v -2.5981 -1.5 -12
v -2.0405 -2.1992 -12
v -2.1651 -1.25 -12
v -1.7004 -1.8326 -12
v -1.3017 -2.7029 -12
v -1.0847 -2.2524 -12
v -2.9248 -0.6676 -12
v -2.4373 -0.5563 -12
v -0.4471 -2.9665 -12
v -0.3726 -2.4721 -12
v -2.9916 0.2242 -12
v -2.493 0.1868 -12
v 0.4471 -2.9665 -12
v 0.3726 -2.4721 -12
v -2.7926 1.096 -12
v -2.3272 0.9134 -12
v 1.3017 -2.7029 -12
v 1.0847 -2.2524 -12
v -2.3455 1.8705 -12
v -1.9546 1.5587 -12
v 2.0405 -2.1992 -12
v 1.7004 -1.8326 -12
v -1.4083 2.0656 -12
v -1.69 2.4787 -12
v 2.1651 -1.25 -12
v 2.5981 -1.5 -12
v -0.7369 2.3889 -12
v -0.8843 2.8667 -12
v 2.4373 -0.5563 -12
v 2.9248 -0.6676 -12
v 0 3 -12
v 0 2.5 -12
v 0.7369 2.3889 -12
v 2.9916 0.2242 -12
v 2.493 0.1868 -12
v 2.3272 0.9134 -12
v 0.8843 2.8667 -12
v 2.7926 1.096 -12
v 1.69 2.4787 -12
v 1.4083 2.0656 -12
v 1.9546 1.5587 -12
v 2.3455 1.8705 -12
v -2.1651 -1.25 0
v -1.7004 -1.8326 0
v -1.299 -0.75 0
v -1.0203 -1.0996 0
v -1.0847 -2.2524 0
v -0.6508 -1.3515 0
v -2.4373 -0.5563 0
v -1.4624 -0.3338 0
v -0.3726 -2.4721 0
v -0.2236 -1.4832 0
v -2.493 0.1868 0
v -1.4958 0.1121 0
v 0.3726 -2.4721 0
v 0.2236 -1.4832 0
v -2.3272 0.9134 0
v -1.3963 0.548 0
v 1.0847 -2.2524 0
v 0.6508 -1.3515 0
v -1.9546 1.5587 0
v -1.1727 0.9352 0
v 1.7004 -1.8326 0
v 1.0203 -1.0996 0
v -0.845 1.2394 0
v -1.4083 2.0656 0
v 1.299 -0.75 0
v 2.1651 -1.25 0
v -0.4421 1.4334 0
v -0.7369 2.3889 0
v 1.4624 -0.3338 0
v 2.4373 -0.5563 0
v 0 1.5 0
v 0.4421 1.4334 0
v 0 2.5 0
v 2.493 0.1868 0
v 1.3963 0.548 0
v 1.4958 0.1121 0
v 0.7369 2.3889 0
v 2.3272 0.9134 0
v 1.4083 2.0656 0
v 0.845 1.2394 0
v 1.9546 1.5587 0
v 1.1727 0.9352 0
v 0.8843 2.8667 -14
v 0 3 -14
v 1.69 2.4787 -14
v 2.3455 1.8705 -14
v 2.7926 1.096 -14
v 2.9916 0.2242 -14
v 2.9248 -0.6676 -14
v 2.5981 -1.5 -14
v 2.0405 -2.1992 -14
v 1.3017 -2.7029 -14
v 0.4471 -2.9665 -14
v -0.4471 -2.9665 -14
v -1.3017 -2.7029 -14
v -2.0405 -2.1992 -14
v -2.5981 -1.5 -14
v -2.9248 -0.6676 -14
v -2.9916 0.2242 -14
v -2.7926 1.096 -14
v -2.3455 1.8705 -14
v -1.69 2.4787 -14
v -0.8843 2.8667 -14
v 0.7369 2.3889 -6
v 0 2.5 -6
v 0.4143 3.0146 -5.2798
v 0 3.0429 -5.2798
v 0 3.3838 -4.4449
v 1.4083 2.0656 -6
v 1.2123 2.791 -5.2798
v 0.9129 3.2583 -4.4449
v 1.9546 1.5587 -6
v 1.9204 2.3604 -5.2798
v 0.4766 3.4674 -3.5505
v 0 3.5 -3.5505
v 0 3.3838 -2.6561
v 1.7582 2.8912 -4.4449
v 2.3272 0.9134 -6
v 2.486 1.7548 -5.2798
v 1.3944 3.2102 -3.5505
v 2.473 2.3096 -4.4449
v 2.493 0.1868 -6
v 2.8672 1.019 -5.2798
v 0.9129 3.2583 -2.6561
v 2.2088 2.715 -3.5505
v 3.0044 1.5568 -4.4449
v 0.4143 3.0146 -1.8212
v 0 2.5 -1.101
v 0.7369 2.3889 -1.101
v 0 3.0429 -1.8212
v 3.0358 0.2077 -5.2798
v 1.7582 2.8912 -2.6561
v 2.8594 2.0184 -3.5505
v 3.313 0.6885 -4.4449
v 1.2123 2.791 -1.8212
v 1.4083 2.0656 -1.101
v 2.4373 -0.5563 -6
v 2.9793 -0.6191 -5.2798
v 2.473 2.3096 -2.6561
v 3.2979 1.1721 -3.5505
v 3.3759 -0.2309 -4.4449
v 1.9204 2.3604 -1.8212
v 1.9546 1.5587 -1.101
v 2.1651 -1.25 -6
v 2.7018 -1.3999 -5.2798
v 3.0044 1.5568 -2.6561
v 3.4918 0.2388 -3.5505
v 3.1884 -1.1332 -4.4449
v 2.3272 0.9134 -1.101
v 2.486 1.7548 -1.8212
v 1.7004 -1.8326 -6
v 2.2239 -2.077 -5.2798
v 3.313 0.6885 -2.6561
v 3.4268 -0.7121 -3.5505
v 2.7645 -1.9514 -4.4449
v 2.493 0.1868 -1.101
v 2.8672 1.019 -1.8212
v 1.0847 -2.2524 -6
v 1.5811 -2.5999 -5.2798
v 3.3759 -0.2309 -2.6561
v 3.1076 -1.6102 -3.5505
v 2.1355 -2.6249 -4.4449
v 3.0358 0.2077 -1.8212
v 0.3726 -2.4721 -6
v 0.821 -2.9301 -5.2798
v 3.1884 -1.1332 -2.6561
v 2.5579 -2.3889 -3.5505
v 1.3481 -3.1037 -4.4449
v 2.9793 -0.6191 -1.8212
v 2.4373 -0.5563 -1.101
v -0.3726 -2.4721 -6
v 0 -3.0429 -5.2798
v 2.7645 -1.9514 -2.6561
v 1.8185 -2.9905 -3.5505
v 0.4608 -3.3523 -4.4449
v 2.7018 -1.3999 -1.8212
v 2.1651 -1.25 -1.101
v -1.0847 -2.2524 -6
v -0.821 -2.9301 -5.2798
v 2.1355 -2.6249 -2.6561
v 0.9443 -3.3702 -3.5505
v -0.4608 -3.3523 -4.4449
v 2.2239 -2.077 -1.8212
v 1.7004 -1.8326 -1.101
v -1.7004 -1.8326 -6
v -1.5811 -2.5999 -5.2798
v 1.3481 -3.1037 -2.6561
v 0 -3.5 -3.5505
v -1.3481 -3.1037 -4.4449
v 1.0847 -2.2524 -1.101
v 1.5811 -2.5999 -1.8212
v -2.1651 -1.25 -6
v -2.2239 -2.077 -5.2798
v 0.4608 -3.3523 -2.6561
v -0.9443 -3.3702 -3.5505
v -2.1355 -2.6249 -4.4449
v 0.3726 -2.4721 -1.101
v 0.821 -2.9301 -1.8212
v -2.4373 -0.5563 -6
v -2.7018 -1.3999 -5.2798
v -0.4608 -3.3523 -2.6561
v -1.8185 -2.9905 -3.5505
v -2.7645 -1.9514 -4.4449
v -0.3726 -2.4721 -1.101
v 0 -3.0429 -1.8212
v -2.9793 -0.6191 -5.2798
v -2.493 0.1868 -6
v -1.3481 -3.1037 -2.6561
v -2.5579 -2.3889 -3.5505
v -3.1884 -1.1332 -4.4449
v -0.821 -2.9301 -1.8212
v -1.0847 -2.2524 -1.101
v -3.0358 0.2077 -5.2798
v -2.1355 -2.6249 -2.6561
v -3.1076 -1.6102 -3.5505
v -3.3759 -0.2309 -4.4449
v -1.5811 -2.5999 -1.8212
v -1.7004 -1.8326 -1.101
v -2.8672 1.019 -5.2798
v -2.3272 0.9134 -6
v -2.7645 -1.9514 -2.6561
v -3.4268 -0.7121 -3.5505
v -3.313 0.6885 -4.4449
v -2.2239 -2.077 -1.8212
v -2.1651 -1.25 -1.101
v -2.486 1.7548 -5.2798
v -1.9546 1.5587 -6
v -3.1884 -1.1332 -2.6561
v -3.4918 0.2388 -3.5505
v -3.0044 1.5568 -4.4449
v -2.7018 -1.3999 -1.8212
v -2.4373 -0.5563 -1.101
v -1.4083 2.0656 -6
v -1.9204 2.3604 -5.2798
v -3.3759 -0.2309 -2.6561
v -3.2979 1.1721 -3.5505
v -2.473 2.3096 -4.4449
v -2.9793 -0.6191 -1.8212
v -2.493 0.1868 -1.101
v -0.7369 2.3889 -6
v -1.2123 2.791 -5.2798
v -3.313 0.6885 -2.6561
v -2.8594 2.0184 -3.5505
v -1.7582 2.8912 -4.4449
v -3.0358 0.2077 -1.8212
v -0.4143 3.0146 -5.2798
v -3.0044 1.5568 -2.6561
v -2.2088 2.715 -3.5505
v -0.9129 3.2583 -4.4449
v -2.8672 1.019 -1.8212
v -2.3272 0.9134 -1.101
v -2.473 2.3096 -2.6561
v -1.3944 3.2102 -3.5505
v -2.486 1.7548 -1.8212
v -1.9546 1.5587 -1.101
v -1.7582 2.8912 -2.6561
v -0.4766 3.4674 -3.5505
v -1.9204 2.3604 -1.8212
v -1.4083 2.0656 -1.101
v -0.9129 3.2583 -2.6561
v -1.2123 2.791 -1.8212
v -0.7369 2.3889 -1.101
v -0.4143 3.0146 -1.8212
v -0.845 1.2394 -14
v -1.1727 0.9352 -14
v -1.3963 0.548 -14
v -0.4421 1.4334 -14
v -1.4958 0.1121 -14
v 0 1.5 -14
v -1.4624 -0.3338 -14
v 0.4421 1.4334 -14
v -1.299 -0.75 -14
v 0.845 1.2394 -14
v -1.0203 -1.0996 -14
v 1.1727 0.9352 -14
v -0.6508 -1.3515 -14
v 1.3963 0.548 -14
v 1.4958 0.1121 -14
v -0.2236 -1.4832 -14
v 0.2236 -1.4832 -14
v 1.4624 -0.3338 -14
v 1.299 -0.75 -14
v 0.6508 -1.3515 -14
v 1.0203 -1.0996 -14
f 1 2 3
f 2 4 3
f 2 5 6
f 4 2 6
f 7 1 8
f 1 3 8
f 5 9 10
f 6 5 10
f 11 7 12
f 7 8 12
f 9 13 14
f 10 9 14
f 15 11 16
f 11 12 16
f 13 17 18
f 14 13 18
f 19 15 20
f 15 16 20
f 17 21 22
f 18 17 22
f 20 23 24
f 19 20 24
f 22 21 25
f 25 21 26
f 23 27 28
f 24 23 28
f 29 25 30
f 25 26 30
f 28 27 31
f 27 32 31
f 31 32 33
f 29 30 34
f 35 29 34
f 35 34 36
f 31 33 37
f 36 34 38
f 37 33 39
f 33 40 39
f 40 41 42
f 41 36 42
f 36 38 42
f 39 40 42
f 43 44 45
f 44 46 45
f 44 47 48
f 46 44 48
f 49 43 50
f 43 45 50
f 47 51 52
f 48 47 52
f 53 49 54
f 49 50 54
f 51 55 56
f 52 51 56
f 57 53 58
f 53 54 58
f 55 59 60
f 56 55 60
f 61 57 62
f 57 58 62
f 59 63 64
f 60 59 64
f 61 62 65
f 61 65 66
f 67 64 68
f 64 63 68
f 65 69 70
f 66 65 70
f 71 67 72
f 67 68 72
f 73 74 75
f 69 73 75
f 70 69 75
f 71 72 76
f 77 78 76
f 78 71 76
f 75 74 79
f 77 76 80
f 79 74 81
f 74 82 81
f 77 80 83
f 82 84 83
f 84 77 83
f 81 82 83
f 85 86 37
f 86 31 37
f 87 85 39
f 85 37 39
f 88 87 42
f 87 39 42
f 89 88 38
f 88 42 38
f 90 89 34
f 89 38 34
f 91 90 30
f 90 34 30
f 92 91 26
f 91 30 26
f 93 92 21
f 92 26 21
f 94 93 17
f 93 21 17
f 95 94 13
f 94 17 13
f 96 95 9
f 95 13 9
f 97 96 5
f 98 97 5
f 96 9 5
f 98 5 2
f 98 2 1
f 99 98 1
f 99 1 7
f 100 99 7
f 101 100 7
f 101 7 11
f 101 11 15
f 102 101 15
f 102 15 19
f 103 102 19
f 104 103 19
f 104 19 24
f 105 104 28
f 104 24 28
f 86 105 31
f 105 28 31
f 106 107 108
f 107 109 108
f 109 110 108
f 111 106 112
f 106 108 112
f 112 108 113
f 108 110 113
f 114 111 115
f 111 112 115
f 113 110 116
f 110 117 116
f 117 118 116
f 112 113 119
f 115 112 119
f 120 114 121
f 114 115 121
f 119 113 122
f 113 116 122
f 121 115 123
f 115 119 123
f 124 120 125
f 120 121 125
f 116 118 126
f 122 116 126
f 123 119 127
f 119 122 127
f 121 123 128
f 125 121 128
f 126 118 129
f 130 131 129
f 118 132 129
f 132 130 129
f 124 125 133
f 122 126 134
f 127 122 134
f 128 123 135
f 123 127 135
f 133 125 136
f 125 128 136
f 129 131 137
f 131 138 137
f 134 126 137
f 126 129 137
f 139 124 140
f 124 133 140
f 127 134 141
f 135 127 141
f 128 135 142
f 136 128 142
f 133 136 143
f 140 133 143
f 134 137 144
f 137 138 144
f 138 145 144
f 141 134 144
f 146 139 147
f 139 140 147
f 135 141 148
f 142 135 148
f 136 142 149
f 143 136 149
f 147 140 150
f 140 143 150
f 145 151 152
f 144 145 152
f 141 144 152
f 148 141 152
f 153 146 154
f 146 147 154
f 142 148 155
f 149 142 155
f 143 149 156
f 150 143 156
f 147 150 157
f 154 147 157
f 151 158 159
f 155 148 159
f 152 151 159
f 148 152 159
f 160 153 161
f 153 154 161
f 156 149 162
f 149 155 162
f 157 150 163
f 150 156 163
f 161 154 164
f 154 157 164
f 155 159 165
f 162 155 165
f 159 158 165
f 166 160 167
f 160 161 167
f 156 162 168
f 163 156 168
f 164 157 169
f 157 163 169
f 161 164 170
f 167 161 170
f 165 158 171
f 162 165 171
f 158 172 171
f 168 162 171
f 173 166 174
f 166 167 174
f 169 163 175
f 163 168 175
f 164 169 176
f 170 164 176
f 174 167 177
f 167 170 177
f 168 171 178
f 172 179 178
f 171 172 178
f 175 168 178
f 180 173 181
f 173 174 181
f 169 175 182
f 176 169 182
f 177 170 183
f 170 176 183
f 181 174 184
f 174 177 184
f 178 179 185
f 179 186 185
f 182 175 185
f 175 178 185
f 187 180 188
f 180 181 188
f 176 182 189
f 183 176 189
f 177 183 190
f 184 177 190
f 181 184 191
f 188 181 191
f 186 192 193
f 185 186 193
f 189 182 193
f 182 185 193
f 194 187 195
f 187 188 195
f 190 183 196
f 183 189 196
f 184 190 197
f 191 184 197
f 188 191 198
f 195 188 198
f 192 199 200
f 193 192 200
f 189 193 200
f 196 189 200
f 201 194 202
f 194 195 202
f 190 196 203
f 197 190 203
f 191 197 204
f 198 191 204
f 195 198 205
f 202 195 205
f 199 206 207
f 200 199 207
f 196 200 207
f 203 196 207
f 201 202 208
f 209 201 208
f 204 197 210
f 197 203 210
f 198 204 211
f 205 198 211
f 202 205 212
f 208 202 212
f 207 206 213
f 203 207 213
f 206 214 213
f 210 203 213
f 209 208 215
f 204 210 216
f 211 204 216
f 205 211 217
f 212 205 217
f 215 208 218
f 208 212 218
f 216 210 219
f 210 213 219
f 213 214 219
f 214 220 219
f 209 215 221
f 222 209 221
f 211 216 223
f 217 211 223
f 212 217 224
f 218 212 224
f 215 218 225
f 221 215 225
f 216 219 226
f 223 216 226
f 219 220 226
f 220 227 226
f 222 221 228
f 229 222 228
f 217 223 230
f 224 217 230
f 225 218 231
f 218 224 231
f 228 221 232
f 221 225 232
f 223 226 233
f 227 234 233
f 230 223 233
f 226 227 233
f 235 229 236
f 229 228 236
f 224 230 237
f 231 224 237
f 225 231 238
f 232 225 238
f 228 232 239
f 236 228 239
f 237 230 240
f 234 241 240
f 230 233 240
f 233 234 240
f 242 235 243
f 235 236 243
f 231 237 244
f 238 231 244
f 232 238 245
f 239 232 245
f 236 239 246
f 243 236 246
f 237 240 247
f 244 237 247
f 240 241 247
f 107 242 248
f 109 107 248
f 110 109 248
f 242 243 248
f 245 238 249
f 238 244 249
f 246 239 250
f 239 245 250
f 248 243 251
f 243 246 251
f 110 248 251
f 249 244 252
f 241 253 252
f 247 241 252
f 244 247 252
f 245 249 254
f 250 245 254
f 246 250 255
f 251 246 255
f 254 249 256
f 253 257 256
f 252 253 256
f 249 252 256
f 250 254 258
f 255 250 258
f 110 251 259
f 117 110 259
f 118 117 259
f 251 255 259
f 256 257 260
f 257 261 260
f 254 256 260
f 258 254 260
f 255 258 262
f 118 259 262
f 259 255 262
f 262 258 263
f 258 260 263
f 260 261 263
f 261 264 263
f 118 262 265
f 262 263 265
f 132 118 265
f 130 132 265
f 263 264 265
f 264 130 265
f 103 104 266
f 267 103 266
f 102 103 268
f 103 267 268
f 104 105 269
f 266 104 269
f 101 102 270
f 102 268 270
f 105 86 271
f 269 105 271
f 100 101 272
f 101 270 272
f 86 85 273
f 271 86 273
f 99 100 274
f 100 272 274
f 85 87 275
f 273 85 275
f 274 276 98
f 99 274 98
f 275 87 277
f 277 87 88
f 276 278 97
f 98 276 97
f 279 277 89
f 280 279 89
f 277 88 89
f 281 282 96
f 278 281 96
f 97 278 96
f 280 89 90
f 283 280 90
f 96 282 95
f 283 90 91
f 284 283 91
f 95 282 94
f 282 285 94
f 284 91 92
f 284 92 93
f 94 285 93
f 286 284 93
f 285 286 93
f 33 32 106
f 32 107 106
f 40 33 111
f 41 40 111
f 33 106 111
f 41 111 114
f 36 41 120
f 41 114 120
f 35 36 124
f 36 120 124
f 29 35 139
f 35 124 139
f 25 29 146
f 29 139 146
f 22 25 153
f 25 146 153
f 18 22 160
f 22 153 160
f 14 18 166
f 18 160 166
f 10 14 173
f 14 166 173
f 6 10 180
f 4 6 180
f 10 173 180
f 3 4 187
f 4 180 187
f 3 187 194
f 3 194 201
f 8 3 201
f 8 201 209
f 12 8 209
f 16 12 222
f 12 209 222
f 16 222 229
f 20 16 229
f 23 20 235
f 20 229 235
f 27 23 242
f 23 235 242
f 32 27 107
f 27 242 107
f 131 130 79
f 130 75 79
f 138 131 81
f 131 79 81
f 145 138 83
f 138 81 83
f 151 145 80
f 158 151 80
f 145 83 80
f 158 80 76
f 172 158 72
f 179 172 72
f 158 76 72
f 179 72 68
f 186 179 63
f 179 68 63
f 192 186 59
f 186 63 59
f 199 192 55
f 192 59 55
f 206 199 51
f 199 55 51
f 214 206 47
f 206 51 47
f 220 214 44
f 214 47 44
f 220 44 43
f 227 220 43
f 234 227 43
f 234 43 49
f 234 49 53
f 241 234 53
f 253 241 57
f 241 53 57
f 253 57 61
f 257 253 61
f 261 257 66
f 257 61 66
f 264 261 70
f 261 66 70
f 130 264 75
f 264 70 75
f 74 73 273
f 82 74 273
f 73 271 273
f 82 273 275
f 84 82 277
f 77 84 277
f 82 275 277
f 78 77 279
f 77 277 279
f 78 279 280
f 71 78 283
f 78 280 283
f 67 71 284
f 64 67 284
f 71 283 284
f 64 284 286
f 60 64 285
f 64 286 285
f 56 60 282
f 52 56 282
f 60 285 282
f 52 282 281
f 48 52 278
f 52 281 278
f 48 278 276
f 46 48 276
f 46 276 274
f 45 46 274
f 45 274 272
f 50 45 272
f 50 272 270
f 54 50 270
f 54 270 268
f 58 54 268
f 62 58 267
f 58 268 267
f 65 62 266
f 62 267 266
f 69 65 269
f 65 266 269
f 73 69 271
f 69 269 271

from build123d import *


with BuildPart() as part:
    # Sketch1 → Revolve1 (revolve)
    with BuildSketch(Plane(origin=(0, 0, 0), x_dir=(0, 0, -1), z_dir=(1, 0, 0))):
        with BuildLine():
            Line((0.388232597, 1.5), (6.712787917, 1.5))
            ThreePointArc((6.712787917, 1.5), (6.400595054, 2.031506006), (6, 2.5))
            ThreePointArc((6, 2.5), (3.550510257, 3.5), (1.101020514, 2.5))
            ThreePointArc((1.101020514, 2.5), (0.700425461, 2.031506006), (0.388232597, 1.5))
        make_face()
        with BuildLine():
            Line((0, 1.5), (0.388232597, 1.5))
            ThreePointArc((0.388232597, 1.5), (0.700425461, 2.031506006), (1.101020514, 2.5))
            Line((1.101020514, 2.5), (0, 2.5))
            Line((0, 2.5), (0, 1.5))
        make_face()
        with BuildLine():
            Line((6.712787917, 1.5), (14, 1.5))
            Line((14, 1.5), (14, 3))
            Line((14, 3), (12, 3))
            Line((12, 3), (12, 2.5))
            Line((12, 2.5), (6, 2.5))
            ThreePointArc((6, 2.5), (6.400595054, 2.031506006), (6.712787917, 1.5))
        make_face()
    revolve(axis=Axis((0, 0, 0), (0, 0, -1)))


solid = part.part
